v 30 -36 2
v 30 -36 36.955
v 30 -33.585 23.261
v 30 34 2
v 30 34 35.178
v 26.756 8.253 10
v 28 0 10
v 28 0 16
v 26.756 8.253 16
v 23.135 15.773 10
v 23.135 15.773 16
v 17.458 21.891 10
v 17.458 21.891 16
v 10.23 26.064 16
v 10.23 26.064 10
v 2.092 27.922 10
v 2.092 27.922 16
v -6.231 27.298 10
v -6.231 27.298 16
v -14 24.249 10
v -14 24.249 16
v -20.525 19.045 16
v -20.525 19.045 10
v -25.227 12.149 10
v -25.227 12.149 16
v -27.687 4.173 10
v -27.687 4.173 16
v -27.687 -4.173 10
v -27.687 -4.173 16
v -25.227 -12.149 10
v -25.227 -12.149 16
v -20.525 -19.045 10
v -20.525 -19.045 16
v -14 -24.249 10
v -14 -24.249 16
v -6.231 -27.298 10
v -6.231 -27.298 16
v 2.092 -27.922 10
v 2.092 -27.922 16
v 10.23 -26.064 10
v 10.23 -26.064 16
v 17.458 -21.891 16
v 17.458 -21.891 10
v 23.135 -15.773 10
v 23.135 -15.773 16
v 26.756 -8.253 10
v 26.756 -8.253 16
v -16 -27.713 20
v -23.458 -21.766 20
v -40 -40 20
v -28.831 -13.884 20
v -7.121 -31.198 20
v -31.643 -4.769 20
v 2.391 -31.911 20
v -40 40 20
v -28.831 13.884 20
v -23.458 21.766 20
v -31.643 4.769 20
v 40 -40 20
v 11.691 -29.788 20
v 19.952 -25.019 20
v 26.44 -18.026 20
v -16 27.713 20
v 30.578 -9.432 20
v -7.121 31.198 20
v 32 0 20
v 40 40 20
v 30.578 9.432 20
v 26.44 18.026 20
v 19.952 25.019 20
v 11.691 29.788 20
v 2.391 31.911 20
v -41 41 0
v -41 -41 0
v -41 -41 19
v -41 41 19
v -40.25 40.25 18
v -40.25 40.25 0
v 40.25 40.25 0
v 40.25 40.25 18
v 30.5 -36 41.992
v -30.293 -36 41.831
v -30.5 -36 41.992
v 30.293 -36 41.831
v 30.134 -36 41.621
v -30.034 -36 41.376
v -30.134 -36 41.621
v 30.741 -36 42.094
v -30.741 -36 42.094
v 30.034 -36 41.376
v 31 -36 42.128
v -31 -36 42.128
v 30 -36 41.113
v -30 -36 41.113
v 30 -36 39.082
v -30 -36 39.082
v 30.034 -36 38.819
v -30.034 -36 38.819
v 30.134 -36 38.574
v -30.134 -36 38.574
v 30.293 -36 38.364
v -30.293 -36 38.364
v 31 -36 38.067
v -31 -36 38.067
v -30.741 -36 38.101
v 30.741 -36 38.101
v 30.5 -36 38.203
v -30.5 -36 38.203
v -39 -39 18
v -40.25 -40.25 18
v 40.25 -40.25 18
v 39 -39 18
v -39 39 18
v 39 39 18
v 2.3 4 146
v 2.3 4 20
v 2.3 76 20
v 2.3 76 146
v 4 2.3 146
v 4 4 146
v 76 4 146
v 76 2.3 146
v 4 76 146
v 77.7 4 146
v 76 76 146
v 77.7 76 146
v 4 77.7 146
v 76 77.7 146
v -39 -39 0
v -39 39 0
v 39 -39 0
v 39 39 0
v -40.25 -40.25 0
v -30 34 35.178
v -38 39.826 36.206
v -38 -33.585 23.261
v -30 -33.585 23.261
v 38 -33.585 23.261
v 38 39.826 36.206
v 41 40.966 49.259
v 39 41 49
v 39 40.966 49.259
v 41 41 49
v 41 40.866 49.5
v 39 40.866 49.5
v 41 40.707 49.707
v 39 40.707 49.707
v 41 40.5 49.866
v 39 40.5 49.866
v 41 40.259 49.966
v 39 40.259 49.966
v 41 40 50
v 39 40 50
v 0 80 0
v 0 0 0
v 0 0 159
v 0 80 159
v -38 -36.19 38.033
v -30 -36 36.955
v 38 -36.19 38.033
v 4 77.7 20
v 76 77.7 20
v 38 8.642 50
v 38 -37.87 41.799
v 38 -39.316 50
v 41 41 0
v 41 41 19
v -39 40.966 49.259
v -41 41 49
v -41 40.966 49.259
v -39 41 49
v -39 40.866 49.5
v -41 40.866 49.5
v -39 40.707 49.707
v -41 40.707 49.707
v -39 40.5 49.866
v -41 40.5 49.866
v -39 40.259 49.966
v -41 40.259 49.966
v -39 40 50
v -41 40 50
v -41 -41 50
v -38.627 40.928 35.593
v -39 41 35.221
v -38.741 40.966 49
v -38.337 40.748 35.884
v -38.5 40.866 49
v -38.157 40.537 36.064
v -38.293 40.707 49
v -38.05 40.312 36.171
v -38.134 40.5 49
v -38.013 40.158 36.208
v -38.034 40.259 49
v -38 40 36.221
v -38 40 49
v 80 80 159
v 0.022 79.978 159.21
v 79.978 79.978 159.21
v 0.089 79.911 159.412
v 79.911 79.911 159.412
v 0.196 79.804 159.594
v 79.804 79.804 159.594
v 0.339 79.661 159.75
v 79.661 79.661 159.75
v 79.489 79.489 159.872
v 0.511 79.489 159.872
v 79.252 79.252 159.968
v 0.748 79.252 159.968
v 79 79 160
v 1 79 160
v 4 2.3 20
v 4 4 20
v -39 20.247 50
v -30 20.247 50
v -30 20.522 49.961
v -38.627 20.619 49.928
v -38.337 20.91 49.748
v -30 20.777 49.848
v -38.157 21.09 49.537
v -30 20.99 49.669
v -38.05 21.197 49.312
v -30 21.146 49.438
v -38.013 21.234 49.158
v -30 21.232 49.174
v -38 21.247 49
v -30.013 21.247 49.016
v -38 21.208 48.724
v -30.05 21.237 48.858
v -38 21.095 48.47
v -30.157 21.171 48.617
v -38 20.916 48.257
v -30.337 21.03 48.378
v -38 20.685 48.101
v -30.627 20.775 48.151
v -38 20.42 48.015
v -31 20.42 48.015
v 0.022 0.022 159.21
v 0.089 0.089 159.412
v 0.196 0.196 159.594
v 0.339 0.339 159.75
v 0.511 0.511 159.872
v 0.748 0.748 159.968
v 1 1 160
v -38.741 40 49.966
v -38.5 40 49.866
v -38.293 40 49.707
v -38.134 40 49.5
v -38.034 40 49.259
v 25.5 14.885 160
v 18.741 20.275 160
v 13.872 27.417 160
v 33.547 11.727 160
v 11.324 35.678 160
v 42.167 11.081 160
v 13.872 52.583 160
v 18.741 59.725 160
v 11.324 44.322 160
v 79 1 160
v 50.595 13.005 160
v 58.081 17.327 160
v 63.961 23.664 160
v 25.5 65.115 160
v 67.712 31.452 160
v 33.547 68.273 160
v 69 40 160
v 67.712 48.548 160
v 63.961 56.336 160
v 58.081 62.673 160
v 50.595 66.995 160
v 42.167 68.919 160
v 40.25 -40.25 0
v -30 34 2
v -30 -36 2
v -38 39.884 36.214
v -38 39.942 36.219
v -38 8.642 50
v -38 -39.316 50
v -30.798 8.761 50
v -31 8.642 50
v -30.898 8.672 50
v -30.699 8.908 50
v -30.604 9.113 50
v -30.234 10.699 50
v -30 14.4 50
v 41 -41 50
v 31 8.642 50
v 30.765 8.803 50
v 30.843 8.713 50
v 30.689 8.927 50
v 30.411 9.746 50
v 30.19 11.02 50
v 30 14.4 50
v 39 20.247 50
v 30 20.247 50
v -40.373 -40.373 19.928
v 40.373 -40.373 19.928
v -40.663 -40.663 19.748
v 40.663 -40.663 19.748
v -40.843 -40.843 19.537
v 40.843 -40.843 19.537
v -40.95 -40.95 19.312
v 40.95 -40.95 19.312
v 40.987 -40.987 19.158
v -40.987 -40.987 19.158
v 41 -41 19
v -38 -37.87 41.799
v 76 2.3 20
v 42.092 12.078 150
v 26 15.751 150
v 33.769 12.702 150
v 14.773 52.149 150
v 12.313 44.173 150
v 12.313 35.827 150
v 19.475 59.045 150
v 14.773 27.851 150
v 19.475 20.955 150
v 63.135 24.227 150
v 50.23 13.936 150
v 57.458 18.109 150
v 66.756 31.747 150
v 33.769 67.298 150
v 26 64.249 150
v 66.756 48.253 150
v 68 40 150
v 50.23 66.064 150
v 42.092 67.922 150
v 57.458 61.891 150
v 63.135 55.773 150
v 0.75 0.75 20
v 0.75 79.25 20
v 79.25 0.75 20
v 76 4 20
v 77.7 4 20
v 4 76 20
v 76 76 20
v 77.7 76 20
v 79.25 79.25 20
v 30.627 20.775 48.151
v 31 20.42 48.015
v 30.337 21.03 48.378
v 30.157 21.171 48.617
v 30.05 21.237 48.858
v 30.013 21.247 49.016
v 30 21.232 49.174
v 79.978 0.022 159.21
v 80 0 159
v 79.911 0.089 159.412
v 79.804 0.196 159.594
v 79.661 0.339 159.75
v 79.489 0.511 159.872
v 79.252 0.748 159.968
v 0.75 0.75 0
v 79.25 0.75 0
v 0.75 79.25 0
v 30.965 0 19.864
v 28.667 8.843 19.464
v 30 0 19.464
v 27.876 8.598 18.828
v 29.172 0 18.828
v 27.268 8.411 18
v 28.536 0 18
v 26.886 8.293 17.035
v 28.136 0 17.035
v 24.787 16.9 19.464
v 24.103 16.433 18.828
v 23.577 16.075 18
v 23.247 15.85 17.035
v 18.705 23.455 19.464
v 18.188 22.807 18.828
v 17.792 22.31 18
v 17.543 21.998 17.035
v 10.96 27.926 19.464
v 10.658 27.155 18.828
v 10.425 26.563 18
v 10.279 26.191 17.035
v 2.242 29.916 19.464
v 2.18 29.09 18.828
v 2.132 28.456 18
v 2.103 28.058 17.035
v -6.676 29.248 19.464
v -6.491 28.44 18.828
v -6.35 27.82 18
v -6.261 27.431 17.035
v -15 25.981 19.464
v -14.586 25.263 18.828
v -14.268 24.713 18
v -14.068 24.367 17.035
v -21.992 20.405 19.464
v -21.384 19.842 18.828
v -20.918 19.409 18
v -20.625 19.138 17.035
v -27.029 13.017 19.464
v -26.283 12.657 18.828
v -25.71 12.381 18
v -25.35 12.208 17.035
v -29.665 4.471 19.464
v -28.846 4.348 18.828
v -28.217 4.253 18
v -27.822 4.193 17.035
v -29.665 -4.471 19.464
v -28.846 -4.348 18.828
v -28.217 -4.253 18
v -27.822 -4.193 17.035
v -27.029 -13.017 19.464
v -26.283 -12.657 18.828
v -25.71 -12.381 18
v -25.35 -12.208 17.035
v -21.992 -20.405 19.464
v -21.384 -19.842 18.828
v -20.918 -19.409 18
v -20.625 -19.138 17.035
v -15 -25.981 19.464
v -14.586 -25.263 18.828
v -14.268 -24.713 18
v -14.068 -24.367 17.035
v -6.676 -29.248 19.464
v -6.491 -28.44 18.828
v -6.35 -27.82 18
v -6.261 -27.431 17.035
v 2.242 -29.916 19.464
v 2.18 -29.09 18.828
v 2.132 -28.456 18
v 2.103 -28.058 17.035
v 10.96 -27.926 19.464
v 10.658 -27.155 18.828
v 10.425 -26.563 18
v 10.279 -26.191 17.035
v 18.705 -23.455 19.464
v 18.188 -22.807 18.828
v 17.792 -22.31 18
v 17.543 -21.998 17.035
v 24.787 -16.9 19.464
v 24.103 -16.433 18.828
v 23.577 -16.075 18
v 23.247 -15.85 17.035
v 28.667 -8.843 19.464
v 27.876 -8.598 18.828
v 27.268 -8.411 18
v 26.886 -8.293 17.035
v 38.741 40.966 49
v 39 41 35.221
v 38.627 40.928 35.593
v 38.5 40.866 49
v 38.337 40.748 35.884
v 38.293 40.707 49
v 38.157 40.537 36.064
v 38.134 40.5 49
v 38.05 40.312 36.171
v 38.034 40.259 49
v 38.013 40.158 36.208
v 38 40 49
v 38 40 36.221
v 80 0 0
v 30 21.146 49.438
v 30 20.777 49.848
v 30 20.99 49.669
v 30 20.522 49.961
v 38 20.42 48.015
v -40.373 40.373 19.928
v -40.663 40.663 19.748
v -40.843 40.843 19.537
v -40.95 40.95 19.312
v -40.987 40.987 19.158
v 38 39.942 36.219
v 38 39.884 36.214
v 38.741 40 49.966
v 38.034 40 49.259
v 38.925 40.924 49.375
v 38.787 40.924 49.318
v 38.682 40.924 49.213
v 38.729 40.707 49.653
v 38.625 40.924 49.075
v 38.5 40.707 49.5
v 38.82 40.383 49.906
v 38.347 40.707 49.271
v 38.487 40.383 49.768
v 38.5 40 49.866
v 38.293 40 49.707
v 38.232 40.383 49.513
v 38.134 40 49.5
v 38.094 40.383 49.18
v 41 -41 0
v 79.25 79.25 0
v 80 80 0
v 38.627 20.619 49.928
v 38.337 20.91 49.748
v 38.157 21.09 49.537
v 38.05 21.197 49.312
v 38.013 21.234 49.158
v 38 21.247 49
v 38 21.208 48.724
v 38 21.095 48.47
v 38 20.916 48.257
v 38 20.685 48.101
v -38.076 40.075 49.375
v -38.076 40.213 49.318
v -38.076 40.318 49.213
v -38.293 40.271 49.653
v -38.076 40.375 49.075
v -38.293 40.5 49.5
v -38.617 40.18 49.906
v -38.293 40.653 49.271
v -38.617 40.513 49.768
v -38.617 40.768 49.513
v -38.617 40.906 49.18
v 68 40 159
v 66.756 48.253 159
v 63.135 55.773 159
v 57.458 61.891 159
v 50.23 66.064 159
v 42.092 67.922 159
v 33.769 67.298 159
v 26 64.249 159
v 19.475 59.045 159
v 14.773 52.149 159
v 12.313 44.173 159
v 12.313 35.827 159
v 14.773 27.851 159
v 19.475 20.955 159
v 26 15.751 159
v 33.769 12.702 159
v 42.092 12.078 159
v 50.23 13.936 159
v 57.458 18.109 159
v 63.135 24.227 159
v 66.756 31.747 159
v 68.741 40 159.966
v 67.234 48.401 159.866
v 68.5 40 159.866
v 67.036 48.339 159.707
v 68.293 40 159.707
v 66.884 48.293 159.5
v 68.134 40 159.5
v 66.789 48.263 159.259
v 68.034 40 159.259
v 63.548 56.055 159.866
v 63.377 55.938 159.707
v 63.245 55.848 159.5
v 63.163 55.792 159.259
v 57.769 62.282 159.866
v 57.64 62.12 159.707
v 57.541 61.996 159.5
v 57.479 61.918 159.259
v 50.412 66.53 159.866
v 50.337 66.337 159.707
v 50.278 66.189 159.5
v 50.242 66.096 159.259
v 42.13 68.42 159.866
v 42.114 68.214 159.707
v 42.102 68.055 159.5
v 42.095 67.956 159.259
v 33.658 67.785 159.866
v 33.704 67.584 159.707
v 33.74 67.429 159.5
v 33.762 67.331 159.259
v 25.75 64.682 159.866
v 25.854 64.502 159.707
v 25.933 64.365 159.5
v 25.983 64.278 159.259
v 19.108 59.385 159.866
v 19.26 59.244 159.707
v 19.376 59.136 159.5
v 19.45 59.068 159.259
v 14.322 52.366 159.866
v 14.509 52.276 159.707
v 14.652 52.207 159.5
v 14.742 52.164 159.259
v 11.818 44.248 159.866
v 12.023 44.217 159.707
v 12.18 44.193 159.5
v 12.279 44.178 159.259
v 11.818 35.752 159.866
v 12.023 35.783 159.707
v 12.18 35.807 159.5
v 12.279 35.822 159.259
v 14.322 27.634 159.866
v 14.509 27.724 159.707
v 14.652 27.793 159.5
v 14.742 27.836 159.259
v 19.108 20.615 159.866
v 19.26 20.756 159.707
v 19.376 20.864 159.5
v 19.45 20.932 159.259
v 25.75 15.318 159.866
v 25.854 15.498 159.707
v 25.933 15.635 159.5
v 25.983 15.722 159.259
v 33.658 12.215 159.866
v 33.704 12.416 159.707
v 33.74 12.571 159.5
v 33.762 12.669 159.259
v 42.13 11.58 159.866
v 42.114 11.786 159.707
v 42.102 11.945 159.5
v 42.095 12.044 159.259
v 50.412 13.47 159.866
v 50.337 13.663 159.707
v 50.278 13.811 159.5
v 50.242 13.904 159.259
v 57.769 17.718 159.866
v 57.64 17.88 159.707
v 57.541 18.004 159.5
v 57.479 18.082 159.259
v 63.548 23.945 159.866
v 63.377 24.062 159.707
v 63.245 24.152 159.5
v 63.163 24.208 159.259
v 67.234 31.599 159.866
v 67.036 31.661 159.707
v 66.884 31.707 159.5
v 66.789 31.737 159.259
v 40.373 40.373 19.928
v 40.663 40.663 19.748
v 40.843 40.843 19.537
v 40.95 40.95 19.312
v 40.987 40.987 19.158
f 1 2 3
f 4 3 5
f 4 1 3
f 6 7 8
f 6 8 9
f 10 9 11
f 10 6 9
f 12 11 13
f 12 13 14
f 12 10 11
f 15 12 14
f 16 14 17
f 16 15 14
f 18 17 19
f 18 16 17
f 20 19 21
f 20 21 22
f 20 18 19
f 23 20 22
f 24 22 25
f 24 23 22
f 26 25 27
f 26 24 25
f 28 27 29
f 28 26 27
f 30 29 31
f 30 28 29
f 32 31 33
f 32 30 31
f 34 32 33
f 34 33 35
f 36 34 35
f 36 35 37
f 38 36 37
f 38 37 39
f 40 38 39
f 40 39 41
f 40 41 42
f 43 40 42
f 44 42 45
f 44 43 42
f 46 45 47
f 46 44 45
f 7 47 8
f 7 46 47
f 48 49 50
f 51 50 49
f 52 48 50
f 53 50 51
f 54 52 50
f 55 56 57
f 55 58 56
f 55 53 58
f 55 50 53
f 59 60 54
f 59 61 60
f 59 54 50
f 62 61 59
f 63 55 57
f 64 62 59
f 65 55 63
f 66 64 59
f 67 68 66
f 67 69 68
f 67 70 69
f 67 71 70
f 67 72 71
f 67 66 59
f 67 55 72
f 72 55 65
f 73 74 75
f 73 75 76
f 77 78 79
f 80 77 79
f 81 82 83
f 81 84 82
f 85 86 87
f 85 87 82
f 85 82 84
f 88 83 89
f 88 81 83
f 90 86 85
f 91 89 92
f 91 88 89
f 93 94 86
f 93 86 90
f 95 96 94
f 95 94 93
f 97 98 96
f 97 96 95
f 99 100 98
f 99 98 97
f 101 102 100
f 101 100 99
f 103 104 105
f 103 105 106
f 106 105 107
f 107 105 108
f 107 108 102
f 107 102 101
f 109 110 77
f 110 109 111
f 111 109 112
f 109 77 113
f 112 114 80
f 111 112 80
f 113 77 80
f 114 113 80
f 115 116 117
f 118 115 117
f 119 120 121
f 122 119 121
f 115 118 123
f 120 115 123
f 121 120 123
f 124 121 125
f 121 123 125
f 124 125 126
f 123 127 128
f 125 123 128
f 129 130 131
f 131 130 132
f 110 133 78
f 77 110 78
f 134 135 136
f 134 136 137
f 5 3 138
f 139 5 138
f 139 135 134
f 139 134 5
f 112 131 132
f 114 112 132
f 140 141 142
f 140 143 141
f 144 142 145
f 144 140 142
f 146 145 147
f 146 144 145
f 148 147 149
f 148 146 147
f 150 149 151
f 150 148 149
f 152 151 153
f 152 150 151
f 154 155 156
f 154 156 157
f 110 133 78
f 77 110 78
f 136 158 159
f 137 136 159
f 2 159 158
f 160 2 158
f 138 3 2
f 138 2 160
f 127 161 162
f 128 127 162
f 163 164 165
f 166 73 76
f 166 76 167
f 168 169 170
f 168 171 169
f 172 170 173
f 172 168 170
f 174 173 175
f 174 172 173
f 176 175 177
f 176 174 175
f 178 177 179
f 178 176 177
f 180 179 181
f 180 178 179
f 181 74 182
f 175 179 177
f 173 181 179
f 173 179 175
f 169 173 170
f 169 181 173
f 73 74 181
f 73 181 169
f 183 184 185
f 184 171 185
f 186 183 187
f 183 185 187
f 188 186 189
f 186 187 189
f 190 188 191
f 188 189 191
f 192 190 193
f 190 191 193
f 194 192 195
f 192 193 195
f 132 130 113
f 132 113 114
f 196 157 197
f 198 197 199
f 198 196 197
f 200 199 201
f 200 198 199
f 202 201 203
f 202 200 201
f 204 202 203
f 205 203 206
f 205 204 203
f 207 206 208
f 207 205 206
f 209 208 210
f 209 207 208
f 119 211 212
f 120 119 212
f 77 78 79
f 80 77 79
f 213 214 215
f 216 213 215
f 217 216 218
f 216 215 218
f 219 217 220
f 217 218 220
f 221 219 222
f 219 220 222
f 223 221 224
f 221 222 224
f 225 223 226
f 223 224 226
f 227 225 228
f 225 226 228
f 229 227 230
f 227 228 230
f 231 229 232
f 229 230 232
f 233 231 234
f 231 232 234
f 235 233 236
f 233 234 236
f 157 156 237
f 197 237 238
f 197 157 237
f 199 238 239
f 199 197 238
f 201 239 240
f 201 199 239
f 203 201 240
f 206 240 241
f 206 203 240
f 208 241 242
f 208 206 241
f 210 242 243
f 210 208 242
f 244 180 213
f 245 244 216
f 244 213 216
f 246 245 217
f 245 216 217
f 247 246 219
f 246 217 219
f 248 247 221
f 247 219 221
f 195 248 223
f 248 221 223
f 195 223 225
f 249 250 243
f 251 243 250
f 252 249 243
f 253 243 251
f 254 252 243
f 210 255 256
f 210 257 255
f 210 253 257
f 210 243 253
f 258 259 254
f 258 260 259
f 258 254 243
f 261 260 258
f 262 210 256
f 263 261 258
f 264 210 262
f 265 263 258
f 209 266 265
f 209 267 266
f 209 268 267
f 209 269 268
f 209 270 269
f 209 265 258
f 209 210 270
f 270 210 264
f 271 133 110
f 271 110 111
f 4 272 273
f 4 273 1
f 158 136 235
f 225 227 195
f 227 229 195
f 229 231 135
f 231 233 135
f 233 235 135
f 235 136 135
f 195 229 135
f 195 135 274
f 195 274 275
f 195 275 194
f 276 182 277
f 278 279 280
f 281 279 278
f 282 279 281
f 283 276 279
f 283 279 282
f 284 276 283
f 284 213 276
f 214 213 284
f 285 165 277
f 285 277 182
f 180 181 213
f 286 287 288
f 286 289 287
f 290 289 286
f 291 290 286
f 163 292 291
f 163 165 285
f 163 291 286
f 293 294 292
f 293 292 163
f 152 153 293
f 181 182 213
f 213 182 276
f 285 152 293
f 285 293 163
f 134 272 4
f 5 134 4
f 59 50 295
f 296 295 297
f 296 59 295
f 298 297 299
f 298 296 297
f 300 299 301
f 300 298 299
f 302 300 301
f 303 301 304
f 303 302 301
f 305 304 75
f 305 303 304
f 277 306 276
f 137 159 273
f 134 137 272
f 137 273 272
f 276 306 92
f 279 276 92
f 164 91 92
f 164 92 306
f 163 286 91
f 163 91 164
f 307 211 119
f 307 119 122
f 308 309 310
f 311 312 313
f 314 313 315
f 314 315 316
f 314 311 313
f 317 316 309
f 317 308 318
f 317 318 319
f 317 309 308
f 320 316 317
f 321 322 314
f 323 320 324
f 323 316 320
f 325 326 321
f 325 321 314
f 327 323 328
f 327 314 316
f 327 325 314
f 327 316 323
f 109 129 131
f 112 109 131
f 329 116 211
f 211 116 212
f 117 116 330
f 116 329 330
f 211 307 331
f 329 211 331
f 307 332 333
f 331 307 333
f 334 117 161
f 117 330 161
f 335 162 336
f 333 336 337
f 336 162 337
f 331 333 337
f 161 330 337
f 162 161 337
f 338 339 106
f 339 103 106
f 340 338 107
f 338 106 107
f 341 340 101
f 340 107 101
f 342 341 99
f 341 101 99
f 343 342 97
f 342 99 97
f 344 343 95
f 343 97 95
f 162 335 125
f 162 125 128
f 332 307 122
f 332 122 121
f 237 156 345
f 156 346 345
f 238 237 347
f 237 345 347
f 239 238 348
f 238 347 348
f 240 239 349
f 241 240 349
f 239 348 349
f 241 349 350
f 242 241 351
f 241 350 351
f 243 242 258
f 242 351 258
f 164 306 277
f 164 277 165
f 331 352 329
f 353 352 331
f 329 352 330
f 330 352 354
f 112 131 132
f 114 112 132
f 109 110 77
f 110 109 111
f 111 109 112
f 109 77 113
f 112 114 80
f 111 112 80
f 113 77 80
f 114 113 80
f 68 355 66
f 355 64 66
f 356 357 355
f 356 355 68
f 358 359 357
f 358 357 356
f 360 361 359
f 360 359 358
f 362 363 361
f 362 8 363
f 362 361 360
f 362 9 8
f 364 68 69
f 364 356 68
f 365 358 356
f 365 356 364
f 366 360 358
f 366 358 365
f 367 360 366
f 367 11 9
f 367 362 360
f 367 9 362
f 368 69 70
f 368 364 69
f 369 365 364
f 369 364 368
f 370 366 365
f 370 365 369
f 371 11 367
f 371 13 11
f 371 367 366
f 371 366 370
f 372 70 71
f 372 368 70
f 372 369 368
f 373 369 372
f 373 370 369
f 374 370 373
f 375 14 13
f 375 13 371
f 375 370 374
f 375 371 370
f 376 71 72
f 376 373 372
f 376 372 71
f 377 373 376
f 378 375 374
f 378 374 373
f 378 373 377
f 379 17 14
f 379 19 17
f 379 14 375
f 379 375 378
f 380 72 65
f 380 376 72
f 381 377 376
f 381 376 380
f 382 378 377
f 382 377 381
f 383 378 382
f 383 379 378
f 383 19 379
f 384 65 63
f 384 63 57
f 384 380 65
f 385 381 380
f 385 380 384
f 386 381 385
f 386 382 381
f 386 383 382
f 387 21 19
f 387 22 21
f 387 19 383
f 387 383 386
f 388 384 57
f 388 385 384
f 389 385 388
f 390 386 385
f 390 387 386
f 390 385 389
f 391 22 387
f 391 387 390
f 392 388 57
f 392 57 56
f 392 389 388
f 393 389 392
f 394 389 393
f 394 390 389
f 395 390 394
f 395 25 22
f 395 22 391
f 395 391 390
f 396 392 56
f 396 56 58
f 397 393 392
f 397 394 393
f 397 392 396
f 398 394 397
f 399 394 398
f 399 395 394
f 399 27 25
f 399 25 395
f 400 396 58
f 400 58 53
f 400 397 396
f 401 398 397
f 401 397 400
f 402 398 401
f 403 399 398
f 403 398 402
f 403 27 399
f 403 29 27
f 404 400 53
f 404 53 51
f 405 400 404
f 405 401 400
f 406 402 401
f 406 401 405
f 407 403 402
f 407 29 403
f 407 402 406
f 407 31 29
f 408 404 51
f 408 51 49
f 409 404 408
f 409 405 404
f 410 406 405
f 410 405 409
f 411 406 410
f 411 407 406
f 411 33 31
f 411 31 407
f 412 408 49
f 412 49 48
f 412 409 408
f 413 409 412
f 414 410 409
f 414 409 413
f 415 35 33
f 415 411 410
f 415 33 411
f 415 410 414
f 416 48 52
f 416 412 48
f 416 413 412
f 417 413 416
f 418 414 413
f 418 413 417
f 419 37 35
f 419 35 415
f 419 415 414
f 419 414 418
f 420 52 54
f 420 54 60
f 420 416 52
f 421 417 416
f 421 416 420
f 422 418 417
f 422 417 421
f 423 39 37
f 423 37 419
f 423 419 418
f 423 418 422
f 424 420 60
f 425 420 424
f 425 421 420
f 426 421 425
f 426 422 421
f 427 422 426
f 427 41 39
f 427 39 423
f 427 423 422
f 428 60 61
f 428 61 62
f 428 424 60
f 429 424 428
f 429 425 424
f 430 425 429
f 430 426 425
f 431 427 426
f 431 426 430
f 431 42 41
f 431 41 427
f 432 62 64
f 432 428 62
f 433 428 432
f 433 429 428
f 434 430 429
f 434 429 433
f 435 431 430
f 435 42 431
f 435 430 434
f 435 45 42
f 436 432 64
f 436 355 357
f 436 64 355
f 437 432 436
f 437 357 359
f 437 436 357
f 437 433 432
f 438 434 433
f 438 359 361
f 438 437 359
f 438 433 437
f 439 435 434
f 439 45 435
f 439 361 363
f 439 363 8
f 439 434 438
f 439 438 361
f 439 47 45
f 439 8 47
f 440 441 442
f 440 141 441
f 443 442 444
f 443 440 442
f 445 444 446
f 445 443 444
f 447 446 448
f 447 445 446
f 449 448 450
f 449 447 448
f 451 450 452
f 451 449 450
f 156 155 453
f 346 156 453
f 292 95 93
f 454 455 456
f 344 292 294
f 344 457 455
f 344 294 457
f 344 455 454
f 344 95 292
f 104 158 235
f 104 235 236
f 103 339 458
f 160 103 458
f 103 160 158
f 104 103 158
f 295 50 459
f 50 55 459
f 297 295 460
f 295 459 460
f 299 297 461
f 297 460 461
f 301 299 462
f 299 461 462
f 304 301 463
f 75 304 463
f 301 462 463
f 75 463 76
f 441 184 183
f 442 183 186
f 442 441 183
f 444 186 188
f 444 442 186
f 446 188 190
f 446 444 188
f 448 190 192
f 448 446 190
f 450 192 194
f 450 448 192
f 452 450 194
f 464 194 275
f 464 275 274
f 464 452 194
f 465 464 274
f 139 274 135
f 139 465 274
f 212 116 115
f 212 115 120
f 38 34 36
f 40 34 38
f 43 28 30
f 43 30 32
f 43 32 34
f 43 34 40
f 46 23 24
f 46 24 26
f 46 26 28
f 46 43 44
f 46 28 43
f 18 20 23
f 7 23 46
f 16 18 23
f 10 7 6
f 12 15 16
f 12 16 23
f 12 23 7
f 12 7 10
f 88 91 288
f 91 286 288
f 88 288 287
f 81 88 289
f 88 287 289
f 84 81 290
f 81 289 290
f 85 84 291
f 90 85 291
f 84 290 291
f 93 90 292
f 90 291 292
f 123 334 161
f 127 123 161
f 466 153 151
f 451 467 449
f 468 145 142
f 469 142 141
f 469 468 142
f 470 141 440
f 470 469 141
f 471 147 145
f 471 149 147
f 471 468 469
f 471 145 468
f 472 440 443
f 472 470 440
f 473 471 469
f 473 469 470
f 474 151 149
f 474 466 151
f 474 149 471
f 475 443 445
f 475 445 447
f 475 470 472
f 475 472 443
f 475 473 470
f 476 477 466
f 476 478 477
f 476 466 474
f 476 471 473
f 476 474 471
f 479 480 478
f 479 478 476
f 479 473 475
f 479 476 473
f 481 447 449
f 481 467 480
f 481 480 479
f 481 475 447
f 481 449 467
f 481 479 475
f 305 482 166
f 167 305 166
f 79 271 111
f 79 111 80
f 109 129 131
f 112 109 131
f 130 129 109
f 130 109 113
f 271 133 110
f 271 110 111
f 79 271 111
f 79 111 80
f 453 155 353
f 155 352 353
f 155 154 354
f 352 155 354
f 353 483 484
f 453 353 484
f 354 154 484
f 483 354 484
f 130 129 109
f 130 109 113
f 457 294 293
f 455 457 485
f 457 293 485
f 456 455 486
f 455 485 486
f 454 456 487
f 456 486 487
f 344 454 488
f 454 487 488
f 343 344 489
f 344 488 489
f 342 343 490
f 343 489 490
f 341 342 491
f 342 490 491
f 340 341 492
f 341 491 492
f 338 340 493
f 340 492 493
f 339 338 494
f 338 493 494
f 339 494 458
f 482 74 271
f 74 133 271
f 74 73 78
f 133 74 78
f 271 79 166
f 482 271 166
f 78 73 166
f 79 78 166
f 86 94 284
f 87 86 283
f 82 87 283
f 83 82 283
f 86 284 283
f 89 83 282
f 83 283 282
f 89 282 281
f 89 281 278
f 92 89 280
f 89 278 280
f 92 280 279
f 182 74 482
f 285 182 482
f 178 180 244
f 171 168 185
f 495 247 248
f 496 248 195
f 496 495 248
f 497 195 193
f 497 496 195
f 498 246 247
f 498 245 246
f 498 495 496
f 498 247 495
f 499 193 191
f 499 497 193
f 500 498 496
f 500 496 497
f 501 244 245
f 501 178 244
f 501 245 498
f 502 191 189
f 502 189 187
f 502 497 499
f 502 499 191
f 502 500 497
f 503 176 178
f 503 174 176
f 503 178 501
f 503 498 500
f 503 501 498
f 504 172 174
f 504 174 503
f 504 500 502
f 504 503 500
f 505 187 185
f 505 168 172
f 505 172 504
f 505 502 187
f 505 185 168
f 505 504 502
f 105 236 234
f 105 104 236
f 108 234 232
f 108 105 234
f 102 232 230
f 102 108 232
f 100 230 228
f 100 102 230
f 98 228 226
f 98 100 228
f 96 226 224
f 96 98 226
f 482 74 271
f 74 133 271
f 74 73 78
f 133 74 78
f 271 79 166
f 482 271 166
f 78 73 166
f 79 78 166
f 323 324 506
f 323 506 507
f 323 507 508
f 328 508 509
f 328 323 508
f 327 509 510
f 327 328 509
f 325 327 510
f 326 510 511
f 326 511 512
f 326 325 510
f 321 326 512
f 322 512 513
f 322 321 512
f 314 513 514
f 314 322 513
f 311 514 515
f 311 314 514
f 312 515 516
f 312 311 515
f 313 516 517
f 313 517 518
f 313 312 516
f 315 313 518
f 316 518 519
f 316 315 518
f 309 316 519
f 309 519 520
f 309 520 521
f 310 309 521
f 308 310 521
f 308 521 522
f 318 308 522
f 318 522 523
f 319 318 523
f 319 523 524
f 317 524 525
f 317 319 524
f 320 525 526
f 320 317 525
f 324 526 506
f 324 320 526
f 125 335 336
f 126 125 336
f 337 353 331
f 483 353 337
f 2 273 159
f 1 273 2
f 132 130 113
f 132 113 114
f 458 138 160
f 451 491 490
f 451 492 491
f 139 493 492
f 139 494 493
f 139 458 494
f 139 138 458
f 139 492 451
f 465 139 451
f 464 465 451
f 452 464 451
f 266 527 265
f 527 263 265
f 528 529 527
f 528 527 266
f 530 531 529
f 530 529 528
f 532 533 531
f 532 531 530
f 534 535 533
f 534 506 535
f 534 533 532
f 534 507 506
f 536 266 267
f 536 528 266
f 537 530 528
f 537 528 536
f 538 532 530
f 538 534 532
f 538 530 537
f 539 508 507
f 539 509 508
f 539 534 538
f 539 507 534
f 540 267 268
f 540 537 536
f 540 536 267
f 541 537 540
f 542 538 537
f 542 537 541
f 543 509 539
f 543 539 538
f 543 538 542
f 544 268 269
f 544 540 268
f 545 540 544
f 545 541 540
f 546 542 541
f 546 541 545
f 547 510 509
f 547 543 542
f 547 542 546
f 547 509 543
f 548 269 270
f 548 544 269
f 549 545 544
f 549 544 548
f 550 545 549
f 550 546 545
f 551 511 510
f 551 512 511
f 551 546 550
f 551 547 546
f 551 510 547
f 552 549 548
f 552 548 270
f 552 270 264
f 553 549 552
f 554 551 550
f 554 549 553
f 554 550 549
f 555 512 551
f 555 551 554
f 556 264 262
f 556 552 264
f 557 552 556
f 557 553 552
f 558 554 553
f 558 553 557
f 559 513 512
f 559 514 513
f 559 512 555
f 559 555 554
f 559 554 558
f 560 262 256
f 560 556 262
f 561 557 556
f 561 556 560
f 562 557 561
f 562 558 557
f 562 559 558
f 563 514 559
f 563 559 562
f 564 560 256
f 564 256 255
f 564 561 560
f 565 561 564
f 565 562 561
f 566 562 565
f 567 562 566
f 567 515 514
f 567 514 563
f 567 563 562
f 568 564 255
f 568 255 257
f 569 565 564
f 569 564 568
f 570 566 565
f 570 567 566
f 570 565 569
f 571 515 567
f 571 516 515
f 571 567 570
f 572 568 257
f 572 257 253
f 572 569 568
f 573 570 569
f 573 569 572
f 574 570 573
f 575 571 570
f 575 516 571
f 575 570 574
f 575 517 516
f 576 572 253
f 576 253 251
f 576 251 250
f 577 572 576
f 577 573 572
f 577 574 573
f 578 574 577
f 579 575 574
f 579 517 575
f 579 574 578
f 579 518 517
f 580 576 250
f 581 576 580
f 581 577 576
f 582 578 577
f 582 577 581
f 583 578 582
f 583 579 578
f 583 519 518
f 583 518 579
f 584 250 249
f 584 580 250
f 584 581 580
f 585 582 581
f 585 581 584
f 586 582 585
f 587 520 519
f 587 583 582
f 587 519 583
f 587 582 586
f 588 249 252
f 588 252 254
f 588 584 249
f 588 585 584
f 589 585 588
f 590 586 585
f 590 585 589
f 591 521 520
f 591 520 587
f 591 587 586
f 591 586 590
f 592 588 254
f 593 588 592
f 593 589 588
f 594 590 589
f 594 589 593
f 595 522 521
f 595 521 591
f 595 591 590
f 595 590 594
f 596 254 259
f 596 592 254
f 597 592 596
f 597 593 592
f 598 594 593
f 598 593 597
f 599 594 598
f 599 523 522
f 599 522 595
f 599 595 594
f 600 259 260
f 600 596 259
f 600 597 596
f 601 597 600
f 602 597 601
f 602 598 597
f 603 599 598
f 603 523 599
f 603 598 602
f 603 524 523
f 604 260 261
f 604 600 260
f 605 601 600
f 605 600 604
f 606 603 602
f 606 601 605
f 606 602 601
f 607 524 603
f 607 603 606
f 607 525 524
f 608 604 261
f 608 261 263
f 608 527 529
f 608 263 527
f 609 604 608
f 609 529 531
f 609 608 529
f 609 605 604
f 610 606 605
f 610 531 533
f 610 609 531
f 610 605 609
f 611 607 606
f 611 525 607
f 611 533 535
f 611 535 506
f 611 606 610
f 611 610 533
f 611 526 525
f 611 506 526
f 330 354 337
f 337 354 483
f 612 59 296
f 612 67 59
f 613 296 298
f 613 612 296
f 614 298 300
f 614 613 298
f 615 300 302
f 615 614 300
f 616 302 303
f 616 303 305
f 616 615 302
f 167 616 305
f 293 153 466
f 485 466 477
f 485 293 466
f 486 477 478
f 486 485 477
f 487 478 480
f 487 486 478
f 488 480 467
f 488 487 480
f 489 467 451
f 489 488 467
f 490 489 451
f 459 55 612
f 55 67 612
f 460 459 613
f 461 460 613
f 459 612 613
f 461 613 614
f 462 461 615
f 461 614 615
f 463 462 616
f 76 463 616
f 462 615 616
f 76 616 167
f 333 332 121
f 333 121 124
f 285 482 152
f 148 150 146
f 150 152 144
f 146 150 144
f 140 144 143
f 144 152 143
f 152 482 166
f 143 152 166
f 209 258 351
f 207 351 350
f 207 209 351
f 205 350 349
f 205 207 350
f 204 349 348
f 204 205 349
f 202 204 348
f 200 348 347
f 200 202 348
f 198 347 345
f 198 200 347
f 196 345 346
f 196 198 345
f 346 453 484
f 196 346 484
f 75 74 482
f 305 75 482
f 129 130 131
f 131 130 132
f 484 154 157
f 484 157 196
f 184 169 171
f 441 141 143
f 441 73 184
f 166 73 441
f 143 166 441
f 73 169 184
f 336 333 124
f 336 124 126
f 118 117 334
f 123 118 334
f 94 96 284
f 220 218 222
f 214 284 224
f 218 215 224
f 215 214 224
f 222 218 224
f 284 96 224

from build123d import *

# Parameters (mm, degrees)
CYLINDER_R             = 28
CYLINDER_DEPTH         = 10
BOX003_W               = 78
BOX003_H               = 78
BOX003_DEPTH           = 18
BOX004_W               = 80.5
BOX004_H               = 80.5
BOX004_DEPTH           = 18
BOX_W                  = 82
BOX_H                  = 82
BOX_DEPTH              = 20
FILLET_1_R             = 4
FILLET_2_R             = 1
BOX011_W               = 60
BOX011_H               = 70
BOX011_DEPTH           = 90
BOX012_W               = 76
BOX012_H               = 90
BOX012_DEPTH           = 15
BOX012_PLACEMENT_ANGLE = 10
BOX010_W               = 76
BOX010_H               = 90
BOX010_DEPTH           = 15
BOX010_PLACEMENT_ANGLE = 10
BOX008_W               = 78
BOX008_H               = 78
BOX008_DEPTH           = 18
BOX009_W               = 80.5
BOX009_H               = 80.5
BOX009_DEPTH           = 18
BOX007_W               = 82
BOX007_H               = 82
BOX007_DEPTH           = 50
FILLET001_R            = 1
BOX016_W               = 3
BOX016_H               = 3
BOX016_DEPTH           = 126
BOX017_W               = 3
BOX017_H               = 3
BOX017_DEPTH           = 126
BOX018_W               = 3
BOX018_H               = 3
BOX018_DEPTH           = 126
BOX019_W               = 3
BOX019_H               = 3
BOX019_DEPTH           = 126
BOX013_W               = 78.5
BOX013_H               = 78.5
BOX013_DEPTH           = 20
CYLINDER001_R          = 28
CYLINDER001_DEPTH      = 10
BOX014_W               = 75.4
BOX014_H               = 75.4
BOX014_DEPTH           = 126
BOX005_W               = 80
BOX005_H               = 80
BOX005_DEPTH           = 160
FILLET002_R            = 1


with BuildPart() as cylinder:
    # Cylinder → Cylinder (new body)
    with BuildSketch(Plane.XY.offset(10)):
        Circle(CYLINDER_R)
    extrude(amount=CYLINDER_DEPTH)


with BuildPart() as cube003:
    # Box003 → Box003 (new body)
    with BuildSketch(Plane(origin=(-39, -39, 0), x_dir=(1, 0, 0), z_dir=(0, 0, 1))):
        with Locations((39, 39)):
            Rectangle(BOX003_W, BOX003_H)
    extrude(amount=BOX003_DEPTH)


with BuildPart() as cube004:
    # Box004 → Box004 (new body)
    with BuildSketch(Plane(origin=(-40.25, -40.25, 0), x_dir=(1, 0, 0), z_dir=(0, 0, 1))):
        with Locations((40.25, 40.25)):
            Rectangle(BOX004_W, BOX004_H)
    extrude(amount=BOX004_DEPTH)


with BuildPart() as fillet_kruh:
    # Box → Box (new body)
    with BuildSketch(Plane(origin=(-41, -41, 0), x_dir=(1, 0, 0), z_dir=(0, 0, 1))):
        with Locations((41, 41)):
            Rectangle(BOX_W, BOX_H)
    extrude(amount=BOX_DEPTH)

    # Cut: cut Cube004
    add(cube004.part, mode=Mode.SUBTRACT)

    # Fusion: union Cube003
    add(cube003.part)

    # Cut001: cut Cylinder
    add(cylinder.part, mode=Mode.SUBTRACT)

    # Fillet 1
    fillet_1_edges = [fillet_kruh.edges().sort_by_distance(p)[0] for p in [
        (-28, 0, 20),
    ]]
    fillet(fillet_1_edges, radius=FILLET_1_R)

    # Fillet 2
    fillet_2_edges = [fillet_kruh.edges().sort_by_distance(p)[0] for p in [
        (-41, 0, 20),
        (0, -41, 20),
        (0, 41, 20),
        (41, 0, 20),
    ]]
    fillet(fillet_2_edges, radius=FILLET_2_R)


with BuildPart() as cube010:
    # Box011 → Box011 (new body)
    with BuildSketch(Plane(origin=(-30, -36, 2), x_dir=(1, 0, 0), z_dir=(0, 0, 1))):
        with Locations((30, 35)):
            Rectangle(BOX011_W, BOX011_H)
    extrude(amount=BOX011_DEPTH)


with BuildPart() as cube011:
    # Box012 → Box012 (new body)
    with BuildSketch(Plane.XY):
        with Locations((38, 45)):
            Rectangle(BOX012_W, BOX012_H)
    extrude(amount=BOX012_DEPTH)


with BuildPart() as cube011_1:
    # Box012 placement: moved
    add(cube011.part.moved(Location((-38, -37.869524, 41.798813))).rotate(Axis((-38, -37.869524, 41.798813), (1, 0, 0)), BOX012_PLACEMENT_ANGLE))


with BuildPart() as fusion002:
    # Box010 → Box010 (new body)
    with BuildSketch(Plane.XY):
        with Locations((38, 45)):
            Rectangle(BOX010_W, BOX010_H)
    extrude(amount=BOX010_DEPTH)


with BuildPart() as fusion002_1:
    # Box010 placement: moved
    add(fusion002.part.moved(Location((-38, -33.585401, 23.261114))).rotate(Axis((-38, -33.585401, 23.261114), (1, 0, 0)), BOX010_PLACEMENT_ANGLE))

    # Fusion002: union Cube010, Cube011
    add(cube010.part)
    add(cube011_1.part)


with BuildPart() as cube007:
    # Box008 → Box008 (new body)
    with BuildSketch(Plane(origin=(-39, -39, 0), x_dir=(1, 0, 0), z_dir=(0, 0, 1))):
        with Locations((39, 39)):
            Rectangle(BOX008_W, BOX008_H)
    extrude(amount=BOX008_DEPTH)


with BuildPart() as cube008:
    # Box009 → Box009 (new body)
    with BuildSketch(Plane(origin=(-40.25, -40.25, 0), x_dir=(1, 0, 0), z_dir=(0, 0, 1))):
        with Locations((40.25, 40.25)):
            Rectangle(BOX009_W, BOX009_H)
    extrude(amount=BOX009_DEPTH)


with BuildPart() as fillet001_stvorec:
    # Box007 → Box007 (new body)
    with BuildSketch(Plane(origin=(-41, -41, 0), x_dir=(1, 0, 0), z_dir=(0, 0, 1))):
        with Locations((41, 41)):
            Rectangle(BOX007_W, BOX007_H)
    extrude(amount=BOX007_DEPTH)

    # Cut002: cut Cube008
    add(cube008.part, mode=Mode.SUBTRACT)

    # Fusion001: union Cube007
    add(cube007.part)

    # Cut003: cut Fusion002
    add(fusion002_1.part, mode=Mode.SUBTRACT)

    # Fillet001
    fillet001_edges = [fillet001_stvorec.edges().sort_by_distance(p)[0] for p in [
        (-39.5, 41, 50),
        (-38, 36.3384, 50),
        (-34, 31.6768, 50),
        (34, 31.6768, 50),
        (38, 36.3384, 50),
        (39.5, 41, 50),
        (38, 41, 43.206266),
        (0, 41, 36.412533),
        (-38, 41, 43.206266),
        (-30, -2.1616, 44.033377),
        (30, -2.1616, 44.033377),
        (-30, -13.679141, 46.06423),
        (30, -13.679141, 46.06423),
    ]]
    fillet(fillet001_edges, radius=FILLET001_R)


with BuildPart() as cube005_nohaupup001:
    # Box016 → Box016 (new body)
    with BuildSketch(Plane(origin=(1, 1, 20), x_dir=(1, 0, 0), z_dir=(0, 0, 1))):
        with Locations((1.5, 1.5)):
            Rectangle(BOX016_W, BOX016_H)
    extrude(amount=BOX016_DEPTH)


with BuildPart() as cube005_nohaupup002:
    # Box017 → Box017 (new body)
    with BuildSketch(Plane(origin=(1, 76, 20), x_dir=(1, 0, 0), z_dir=(0, 0, 1))):
        with Locations((1.5, 1.5)):
            Rectangle(BOX017_W, BOX017_H)
    extrude(amount=BOX017_DEPTH)


with BuildPart() as cube005_nohaupup003:
    # Box018 → Box018 (new body)
    with BuildSketch(Plane(origin=(76, 1, 20), x_dir=(1, 0, 0), z_dir=(0, 0, 1))):
        with Locations((1.5, 1.5)):
            Rectangle(BOX018_W, BOX018_H)
    extrude(amount=BOX018_DEPTH)


with BuildPart() as cube005_nohaupup004:
    # Box019 → Box019 (new body)
    with BuildSketch(Plane(origin=(76, 76, 20), x_dir=(1, 0, 0), z_dir=(0, 0, 1))):
        with Locations((1.5, 1.5)):
            Rectangle(BOX019_W, BOX019_H)
    extrude(amount=BOX019_DEPTH)


with BuildPart() as cube005_noha_up:
    # Box013 → Box013 (new body)
    with BuildSketch(Plane(origin=(0.75, 0.75, 0), x_dir=(1, 0, 0), z_dir=(0, 0, 1))):
        with Locations((39.25, 39.25)):
            Rectangle(BOX013_W, BOX013_H)
    extrude(amount=BOX013_DEPTH)


with BuildPart() as cylinder001:
    # Cylinder001 → Cylinder001 (new body)
    with BuildSketch(Plane(origin=(40, 40, 150), x_dir=(1, 0, 0), z_dir=(0, 0, 1))):
        Circle(CYLINDER001_R)
    extrude(amount=CYLINDER001_DEPTH)


with BuildPart() as fusion003:
    # Box014 → Box014 (new body)
    with BuildSketch(Plane(origin=(2.3, 2.3, 20), x_dir=(1, 0, 0), z_dir=(0, 0, 1))):
        with Locations((37.7, 37.7)):
            Rectangle(BOX014_W, BOX014_H)
    extrude(amount=BOX014_DEPTH)

    # Fusion003: union Cube005_noha_up, Cylinder001
    add(cube005_noha_up.part)
    add(cylinder001.part)


with BuildPart() as fusion004_noha:
    # Box005 → Box005 (new body)
    with BuildSketch(Plane.XY):
        with Locations((40, 40)):
            Rectangle(BOX005_W, BOX005_H)
    extrude(amount=BOX005_DEPTH)

    # Cut004: cut Fusion003
    add(fusion003.part, mode=Mode.SUBTRACT)

    # Fillet002
    fillet002_edges = [fusion004_noha.edges().sort_by_distance(p)[0] for p in [
        (0, 40, 160),
        (40, 0, 160),
        (40, 80, 160),
        (80, 40, 160),
        (12, 40, 160),
    ]]
    fillet(fillet002_edges, radius=FILLET002_R)

    # Fusion004: union Cube005_nohaupup001, Cube005_nohaupup002, Cube005_nohaupup003, Cube005_nohaupup004
    add(cube005_nohaupup001.part)
    add(cube005_nohaupup002.part)
    add(cube005_nohaupup003.part)
    add(cube005_nohaupup004.part)


solid = Compound([fillet_kruh.part, fillet001_stvorec.part, fusion004_noha.part])
